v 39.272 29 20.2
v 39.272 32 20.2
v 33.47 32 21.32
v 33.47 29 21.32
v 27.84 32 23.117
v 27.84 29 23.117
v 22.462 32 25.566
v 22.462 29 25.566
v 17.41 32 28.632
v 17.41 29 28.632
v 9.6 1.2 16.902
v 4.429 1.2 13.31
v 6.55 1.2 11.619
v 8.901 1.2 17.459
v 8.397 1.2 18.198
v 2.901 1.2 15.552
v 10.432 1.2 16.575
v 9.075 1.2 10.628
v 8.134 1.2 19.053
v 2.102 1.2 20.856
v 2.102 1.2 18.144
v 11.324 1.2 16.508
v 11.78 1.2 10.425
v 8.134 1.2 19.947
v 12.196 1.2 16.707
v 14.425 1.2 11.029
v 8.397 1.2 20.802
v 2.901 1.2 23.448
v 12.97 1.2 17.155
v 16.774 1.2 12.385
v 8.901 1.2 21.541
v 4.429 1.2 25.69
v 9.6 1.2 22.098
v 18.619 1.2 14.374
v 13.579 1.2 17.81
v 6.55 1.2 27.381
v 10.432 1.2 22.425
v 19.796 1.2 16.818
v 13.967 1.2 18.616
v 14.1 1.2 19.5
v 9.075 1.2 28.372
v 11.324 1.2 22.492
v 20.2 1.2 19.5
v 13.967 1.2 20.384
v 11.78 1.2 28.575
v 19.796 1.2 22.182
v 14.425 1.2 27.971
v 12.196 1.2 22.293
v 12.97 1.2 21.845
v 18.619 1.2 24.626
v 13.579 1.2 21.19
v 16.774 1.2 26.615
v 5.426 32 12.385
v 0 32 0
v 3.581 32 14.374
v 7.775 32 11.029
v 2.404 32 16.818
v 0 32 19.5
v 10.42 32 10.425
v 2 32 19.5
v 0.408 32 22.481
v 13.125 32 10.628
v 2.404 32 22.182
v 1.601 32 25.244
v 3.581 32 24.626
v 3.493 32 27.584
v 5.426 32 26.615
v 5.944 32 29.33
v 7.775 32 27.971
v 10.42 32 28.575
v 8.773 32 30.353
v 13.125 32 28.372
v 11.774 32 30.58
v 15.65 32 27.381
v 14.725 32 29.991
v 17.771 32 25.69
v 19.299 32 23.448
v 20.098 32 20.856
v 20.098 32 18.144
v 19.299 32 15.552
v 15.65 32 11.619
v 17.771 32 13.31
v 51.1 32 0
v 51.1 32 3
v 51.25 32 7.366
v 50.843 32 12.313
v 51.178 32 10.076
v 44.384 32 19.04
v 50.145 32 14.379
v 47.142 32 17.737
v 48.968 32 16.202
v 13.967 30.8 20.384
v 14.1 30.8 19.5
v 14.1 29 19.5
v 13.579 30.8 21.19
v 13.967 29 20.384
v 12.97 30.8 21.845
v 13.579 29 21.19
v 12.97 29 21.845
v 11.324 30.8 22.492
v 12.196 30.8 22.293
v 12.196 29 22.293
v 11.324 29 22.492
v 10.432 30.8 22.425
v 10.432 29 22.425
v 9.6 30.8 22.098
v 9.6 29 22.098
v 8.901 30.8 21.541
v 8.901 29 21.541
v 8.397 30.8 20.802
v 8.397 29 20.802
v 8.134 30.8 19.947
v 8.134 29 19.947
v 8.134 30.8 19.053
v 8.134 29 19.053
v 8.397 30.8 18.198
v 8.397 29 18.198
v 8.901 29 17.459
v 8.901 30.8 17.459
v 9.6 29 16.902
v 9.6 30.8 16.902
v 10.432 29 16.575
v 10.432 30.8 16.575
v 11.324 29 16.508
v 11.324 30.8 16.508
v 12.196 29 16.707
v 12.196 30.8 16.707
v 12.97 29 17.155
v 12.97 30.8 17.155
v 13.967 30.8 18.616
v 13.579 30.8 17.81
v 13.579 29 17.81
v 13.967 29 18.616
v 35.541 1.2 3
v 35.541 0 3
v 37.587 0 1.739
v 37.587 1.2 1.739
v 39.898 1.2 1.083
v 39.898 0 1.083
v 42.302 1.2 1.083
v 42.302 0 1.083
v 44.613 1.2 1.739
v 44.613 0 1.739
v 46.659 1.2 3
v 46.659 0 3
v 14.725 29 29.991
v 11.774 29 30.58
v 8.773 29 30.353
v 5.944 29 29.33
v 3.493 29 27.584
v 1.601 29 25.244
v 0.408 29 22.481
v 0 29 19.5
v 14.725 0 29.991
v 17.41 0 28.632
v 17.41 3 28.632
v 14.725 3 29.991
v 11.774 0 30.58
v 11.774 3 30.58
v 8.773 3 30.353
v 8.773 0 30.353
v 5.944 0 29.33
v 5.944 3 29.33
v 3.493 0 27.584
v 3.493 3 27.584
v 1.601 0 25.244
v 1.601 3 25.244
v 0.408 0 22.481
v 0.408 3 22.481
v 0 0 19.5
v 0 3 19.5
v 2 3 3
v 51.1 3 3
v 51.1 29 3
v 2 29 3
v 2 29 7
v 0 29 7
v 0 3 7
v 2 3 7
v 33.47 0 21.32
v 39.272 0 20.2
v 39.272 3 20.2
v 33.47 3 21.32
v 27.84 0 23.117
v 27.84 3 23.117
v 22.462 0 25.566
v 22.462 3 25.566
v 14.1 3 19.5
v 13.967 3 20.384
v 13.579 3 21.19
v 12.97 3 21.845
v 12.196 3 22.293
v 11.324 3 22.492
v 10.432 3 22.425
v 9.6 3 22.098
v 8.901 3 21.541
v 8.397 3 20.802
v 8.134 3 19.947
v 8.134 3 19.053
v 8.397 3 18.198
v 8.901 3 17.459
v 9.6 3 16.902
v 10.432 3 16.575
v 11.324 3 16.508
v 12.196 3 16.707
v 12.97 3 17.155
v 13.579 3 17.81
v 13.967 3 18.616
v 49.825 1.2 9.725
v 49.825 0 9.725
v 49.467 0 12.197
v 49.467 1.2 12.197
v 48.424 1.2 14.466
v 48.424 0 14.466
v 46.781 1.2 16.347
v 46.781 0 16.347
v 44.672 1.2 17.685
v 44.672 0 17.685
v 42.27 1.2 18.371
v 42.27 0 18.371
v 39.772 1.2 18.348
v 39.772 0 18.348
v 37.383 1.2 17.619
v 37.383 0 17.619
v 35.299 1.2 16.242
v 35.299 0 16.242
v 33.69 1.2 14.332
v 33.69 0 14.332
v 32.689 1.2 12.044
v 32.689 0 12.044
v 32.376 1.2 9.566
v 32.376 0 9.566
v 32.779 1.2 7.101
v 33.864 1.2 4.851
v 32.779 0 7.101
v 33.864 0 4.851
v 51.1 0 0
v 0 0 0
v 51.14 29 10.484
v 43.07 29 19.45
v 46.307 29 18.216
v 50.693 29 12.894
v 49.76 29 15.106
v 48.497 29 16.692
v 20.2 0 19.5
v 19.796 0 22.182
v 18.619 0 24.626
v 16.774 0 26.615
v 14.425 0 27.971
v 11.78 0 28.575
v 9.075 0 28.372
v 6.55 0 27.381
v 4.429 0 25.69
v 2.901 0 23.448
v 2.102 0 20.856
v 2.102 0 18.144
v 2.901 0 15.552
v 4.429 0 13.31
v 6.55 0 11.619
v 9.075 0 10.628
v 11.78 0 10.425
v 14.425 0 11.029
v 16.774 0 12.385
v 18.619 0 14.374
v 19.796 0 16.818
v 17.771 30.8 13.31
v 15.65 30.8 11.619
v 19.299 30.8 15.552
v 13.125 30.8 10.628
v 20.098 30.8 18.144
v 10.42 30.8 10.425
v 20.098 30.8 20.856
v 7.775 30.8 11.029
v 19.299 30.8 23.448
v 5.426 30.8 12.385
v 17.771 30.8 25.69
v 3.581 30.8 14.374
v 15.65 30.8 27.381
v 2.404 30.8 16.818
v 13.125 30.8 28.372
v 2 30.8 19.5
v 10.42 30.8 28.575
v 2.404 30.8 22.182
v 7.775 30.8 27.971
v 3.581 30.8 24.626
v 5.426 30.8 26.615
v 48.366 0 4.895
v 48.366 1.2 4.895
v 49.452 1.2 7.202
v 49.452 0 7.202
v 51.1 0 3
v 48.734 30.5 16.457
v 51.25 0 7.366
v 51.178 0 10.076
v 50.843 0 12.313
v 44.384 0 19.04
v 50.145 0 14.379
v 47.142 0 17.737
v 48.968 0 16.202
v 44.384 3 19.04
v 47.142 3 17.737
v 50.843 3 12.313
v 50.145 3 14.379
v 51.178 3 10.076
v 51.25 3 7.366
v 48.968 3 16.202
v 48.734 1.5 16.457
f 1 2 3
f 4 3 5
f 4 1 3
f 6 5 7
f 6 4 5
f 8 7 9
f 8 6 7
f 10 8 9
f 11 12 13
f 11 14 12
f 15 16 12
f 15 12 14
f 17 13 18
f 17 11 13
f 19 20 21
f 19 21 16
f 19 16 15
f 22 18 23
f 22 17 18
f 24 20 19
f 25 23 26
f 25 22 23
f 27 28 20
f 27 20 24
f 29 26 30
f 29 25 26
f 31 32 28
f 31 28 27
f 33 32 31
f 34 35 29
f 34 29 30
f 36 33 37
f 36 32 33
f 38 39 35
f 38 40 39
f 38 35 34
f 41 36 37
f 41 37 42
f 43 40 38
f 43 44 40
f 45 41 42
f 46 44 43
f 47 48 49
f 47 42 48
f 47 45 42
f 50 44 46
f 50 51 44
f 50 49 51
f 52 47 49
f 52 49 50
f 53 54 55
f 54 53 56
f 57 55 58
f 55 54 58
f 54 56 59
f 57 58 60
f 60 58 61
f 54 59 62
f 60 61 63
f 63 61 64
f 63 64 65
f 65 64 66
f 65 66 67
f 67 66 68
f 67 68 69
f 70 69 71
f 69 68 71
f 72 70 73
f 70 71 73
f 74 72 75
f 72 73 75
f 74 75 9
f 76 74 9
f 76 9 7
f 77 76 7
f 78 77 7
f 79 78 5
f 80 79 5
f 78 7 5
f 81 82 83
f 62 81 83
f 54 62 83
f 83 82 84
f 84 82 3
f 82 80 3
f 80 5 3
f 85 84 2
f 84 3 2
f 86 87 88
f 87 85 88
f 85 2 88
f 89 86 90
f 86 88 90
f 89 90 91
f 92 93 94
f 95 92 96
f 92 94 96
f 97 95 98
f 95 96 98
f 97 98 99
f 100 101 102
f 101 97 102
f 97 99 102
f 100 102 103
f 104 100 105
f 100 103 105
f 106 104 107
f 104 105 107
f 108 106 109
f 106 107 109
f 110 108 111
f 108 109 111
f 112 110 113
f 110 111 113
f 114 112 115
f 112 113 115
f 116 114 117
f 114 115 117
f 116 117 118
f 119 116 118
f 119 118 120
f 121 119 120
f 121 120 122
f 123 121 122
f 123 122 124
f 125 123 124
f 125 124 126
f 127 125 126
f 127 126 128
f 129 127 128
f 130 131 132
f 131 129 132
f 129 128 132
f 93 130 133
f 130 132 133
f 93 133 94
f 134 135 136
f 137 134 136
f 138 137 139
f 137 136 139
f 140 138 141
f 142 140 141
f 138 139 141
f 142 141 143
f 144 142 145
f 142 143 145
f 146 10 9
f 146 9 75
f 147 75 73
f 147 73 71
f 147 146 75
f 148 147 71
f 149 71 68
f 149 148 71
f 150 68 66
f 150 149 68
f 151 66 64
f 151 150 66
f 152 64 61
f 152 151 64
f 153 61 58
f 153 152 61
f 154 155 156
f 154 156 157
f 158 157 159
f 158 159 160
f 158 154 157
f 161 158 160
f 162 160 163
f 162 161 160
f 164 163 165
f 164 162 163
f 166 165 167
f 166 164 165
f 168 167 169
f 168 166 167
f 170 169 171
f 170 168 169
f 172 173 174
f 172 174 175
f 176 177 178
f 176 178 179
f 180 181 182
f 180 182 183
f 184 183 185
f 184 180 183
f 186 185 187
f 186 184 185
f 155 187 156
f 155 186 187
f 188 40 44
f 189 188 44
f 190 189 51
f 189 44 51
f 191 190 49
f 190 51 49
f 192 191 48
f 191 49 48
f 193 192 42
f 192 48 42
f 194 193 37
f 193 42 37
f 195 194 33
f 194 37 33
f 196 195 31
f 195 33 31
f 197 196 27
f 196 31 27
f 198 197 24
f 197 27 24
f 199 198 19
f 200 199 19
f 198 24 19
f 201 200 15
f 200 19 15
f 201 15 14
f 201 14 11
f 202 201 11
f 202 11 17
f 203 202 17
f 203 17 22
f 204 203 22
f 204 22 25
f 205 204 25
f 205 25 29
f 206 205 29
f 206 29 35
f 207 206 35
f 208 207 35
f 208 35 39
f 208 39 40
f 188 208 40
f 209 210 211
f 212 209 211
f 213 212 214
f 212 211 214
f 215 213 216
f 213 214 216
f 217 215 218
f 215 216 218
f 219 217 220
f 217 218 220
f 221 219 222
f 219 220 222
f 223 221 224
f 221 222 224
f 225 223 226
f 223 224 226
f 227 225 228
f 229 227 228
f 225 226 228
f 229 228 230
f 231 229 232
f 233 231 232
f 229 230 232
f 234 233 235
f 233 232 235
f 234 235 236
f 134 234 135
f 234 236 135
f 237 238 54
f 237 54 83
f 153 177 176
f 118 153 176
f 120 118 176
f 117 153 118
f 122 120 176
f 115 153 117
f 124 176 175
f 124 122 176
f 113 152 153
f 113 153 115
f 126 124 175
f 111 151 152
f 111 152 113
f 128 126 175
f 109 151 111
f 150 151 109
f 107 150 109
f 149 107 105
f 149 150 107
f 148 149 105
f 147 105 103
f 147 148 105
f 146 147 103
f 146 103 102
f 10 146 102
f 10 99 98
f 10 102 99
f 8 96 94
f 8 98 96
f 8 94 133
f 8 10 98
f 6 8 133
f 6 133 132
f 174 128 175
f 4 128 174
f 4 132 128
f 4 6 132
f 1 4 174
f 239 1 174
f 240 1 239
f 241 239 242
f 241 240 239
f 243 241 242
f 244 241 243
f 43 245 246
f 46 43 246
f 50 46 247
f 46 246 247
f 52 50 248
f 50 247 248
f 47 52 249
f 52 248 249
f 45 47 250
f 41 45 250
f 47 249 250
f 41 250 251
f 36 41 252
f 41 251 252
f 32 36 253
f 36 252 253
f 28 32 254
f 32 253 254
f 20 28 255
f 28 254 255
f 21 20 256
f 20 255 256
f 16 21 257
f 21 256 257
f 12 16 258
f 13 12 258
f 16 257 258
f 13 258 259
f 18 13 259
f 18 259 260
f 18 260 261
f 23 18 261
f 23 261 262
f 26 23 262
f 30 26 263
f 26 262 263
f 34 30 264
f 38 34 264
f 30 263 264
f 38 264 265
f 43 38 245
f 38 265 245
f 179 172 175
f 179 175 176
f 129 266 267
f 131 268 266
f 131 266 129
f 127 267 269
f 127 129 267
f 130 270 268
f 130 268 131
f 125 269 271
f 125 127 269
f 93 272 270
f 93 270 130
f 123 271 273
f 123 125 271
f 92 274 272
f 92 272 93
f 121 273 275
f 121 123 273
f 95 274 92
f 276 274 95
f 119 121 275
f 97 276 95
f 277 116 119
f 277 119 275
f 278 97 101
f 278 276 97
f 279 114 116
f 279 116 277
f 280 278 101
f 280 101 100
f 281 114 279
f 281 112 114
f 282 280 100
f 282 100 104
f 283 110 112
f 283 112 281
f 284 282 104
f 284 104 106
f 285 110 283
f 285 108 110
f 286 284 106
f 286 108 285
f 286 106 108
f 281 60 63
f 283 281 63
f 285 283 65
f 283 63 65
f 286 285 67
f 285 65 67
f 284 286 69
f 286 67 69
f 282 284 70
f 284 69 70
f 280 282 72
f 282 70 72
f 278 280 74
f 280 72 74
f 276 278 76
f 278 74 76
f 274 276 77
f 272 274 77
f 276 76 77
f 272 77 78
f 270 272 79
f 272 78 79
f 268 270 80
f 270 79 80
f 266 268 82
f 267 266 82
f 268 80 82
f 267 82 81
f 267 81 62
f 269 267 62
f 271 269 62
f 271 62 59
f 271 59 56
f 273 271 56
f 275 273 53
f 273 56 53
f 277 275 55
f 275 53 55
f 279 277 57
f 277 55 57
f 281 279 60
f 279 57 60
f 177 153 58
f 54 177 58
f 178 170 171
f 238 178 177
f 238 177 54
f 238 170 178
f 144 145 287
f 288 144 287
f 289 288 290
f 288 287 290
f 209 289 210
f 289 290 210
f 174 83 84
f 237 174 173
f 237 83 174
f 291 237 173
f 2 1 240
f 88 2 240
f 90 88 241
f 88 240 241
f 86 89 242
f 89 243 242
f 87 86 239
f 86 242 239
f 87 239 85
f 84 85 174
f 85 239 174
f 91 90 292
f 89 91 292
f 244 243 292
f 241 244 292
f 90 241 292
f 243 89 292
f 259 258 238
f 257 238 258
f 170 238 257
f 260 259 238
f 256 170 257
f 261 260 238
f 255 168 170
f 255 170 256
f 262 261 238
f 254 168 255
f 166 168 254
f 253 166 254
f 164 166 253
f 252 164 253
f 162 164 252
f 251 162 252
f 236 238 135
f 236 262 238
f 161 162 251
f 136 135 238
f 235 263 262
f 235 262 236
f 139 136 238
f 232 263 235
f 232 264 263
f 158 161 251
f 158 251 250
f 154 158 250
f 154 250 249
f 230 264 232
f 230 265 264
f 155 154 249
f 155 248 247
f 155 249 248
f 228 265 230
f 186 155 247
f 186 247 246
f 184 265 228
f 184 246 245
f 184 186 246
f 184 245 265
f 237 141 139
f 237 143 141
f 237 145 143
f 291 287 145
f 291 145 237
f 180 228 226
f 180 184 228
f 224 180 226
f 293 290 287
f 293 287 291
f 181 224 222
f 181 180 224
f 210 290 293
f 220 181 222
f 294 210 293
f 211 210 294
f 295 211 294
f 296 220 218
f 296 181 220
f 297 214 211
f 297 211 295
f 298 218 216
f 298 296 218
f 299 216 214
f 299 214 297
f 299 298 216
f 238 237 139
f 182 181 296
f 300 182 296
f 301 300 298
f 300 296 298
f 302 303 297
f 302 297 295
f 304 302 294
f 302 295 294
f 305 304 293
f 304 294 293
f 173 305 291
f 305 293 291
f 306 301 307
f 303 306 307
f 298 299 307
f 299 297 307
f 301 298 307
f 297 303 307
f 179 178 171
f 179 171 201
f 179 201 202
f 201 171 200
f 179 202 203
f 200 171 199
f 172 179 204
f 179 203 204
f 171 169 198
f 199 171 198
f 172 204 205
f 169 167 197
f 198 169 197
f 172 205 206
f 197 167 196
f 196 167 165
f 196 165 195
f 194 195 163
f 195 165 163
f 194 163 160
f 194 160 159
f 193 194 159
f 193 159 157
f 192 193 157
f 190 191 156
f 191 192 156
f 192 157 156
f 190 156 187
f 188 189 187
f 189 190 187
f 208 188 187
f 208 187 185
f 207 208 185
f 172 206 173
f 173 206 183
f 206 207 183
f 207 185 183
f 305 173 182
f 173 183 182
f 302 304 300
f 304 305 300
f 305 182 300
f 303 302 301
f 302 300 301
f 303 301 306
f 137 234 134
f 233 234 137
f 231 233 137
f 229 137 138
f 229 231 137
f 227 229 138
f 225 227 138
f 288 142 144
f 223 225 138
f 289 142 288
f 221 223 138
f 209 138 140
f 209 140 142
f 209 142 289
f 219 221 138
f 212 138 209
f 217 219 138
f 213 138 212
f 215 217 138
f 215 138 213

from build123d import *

# Parameters (mm, degrees)
F0_R            = 9.1
F0_W            = 2
F0_H            = 4
F0_R_2          = 3
F1_DEPTH        = 3
F1_COPIES_COUNT = 2
F1_COPIES_PITCH = 29
F2_DEPTH        = 32
F3_R            = 9.1
F4_DEPTH        = 3
F5_DEPTH        = 1.2
F3_R_2          = 3
F6_DEPTH        = 1.2


# Not quite as in the source:
# - a pattern or mirror of a feature is missing from the dataset's text; its kind, count and spacing are read off the source's solid


with BuildPart() as f1:
    # F0 (on Front) → F1 (new body)
    with BuildSketch(Plane.XZ):
        with BuildLine():
            Line((46.6587768439, 3), (51.1, 3))
            add(Edge.make_bspline(
                [(39.2721801194, 20.2002895195), (43.2600263156, 19.672514392), (52.7768717224, 16.5297183629), (51.1, 6.6124380804), (51.1, 3)],
                knots=[0.3415991708, 0.3415991708, 0.3415991708, 0.3415991708, 0.5830024084, 1, 1, 1, 1], degree=3))
            ThreePointArc((39.2721801194, 20.2002895195), (27.8400722418, 23.1174494268), (17.4097910893, 28.6321704107))
            ThreePointArc((17.4097910893, 28.6321704107), (5.9438716604, 29.329768082), (0, 19.5))
            Line((0, 19.5), (0, 7))
            Line((0, 7), (2, 7))
            Line((2, 7), (2, 3))
            Line((2, 3), (35.5412231561, 3))
            ThreePointArc((35.5412231561, 3), (37.3834628323, 17.6188568825), (49.825, 9.725))
            ThreePointArc((49.825, 9.725), (48.9938568825, 6.0084628323), (46.6587768439, 3))
        make_face()
        with Locations((11.1, 19.5)):
            Circle(F0_R, mode=Mode.SUBTRACT)
        with Locations((1, 5)):
            Rectangle(F0_W, F0_H)
        with BuildLine():
            Line((0, 3), (0, 0))
            Line((0, 0), (51.1, 0))
            Line((51.1, 0), (51.1, 3))
            Line((51.1, 3), (46.6587768439, 3))
            ThreePointArc((46.6587768439, 3), (41.1, 1), (35.5412231561, 3))
            Line((35.5412231561, 3), (2, 3))
            Line((2, 3), (0, 3))
        make_face()
        with BuildLine():
            Line((35.5412231561, 3), (46.6587768439, 3))
            ThreePointArc((46.6587768439, 3), (48.9938568825, 6.0084628323), (49.825, 9.725))
            ThreePointArc((49.825, 9.725), (37.3834628323, 17.6188568825), (35.5412231561, 3))
        make_face()
        with BuildLine():
            ThreePointArc((35.5412231561, 3), (41.1, 1), (46.6587768439, 3))
            Line((46.6587768439, 3), (35.5412231561, 3))
        make_face()
        with Locations((11.1, 19.5)):
            Circle(F0_R)
        with Locations((11.1, 19.5)):
            Circle(F0_R_2, mode=Mode.SUBTRACT)
    extrude(amount=-F1_DEPTH)


with BuildPart() as f1_copies_1:
    # F1_copies: instance of F1
    add(f1.part.moved(Location(Vector(0, 1, 0) * (1 * F1_COPIES_PITCH))))


with BuildPart() as f1_1:
    add(f1.part)

    add(f1_copies_1.part)  # F2 merges F1_copies_1
    # F0 (on Front) → F2 (join)
    with BuildSketch(Plane.XZ):
        with BuildLine():
            ThreePointArc((35.5412231561, 3), (41.1, 1), (46.6587768439, 3))
            Line((46.6587768439, 3), (35.5412231561, 3))
        make_face()
        with BuildLine():
            Line((0, 3), (0, 0))
            Line((0, 0), (51.1, 0))
            Line((51.1, 0), (51.1, 3))
            Line((51.1, 3), (46.6587768439, 3))
            ThreePointArc((46.6587768439, 3), (41.1, 1), (35.5412231561, 3))
            Line((35.5412231561, 3), (2, 3))
            Line((2, 3), (0, 3))
        make_face()
        with Locations((1, 5)):
            Rectangle(F0_W, F0_H)
    extrude(amount=-F2_DEPTH)

    # F3 (on face) → F4 (join)
    with BuildSketch(Plane(origin=(0, 32, 0), x_dir=(-1, 0, 0), z_dir=(0, 1, 0))):
        with BuildLine():
            Line((-35.5412231561, 3), (-2, 3))
            Line((-2, 3), (-2, 7))
            Line((-2, 7), (0, 7))
            Line((0, 7), (0, 19.5))
            ThreePointArc((0, 19.5), (-5.9438716604, 29.329768082), (-17.4097910893, 28.6321704107))
            ThreePointArc((-17.4097910893, 28.6321704107), (-24.6422981145, 24.4802718869), (-32.4642883797, 21.5882332434))
            ThreePointArc((-32.4642883797, 21.5882332434), (-35.8440967329, 20.7758663792), (-39.2721801194, 20.2002895195))
            add(Edge.make_bspline(
                [(-39.2721801194, 20.2002895195), (-43.2600263156, 19.672514392), (-50.5817963384, 17.2546092175), (-51.2780387876, 10.8269071453), (-51.2543959351, 7.7483589961)],
                knots=[0.3415991708, 0.3415991708, 0.3415991708, 0.3415991708, 0.5830024084, 0.8481388116, 0.8481388116, 0.8481388116, 0.8481388116], degree=3))
            add(Edge.make_bspline(
                [(-51.1, 3), (-50.9854700291, 4.1577635436), (-50.9621826453, 5.7020696678), (-51.1914335387, 7.3646437275), (-51.2543959351, 7.7483589961)],
                knots=[0, 0, 0, 0, 3.6124380804, 4.6797314617, 4.6797314617, 4.6797314617, 4.6797314617], degree=3))
            Line((-51.1, 3), (-46.6587768439, 3))
            ThreePointArc((-46.6587768439, 3), (-41.1, 18.45), (-35.5412231561, 3))
        make_face()
        with Locations((-11.1, 19.5)):
            Circle(F3_R, mode=Mode.SUBTRACT)
        with BuildLine():
            Line((-46.6587768439, 3), (-35.5412231561, 3))
            ThreePointArc((-35.5412231561, 3), (-41.1, 18.45), (-46.6587768439, 3))
        make_face()
    extrude(amount=-F4_DEPTH)

    # F0 (on Front) → F5 (cut)
    with BuildSketch(Plane.XZ):
        with Locations((11.1, 19.5)):
            Circle(F0_R)
        with Locations((11.1, 19.5)):
            Circle(F0_R_2, mode=Mode.SUBTRACT)
        with BuildLine():
            Line((35.5412231561, 3), (46.6587768439, 3))
            ThreePointArc((46.6587768439, 3), (48.9938568825, 6.0084628323), (49.825, 9.725))
            ThreePointArc((49.825, 9.725), (37.3834628323, 17.6188568825), (35.5412231561, 3))
        make_face()
        with BuildLine():
            ThreePointArc((35.5412231561, 3), (41.1, 1), (46.6587768439, 3))
            Line((46.6587768439, 3), (35.5412231561, 3))
        make_face()
    extrude(amount=-F5_DEPTH, mode=Mode.SUBTRACT)

    # F3 (on face) → F6 (cut)
    with BuildSketch(Plane(origin=(0, 32, 0), x_dir=(-1, 0, 0), z_dir=(0, 1, 0))):
        with Locations((-11.1, 19.5)):
            Circle(F3_R)
        with Locations((-11.1, 19.5)):
            Circle(F3_R_2, mode=Mode.SUBTRACT)
    extrude(amount=-F6_DEPTH, mode=Mode.SUBTRACT)


solid = f1_1.part
